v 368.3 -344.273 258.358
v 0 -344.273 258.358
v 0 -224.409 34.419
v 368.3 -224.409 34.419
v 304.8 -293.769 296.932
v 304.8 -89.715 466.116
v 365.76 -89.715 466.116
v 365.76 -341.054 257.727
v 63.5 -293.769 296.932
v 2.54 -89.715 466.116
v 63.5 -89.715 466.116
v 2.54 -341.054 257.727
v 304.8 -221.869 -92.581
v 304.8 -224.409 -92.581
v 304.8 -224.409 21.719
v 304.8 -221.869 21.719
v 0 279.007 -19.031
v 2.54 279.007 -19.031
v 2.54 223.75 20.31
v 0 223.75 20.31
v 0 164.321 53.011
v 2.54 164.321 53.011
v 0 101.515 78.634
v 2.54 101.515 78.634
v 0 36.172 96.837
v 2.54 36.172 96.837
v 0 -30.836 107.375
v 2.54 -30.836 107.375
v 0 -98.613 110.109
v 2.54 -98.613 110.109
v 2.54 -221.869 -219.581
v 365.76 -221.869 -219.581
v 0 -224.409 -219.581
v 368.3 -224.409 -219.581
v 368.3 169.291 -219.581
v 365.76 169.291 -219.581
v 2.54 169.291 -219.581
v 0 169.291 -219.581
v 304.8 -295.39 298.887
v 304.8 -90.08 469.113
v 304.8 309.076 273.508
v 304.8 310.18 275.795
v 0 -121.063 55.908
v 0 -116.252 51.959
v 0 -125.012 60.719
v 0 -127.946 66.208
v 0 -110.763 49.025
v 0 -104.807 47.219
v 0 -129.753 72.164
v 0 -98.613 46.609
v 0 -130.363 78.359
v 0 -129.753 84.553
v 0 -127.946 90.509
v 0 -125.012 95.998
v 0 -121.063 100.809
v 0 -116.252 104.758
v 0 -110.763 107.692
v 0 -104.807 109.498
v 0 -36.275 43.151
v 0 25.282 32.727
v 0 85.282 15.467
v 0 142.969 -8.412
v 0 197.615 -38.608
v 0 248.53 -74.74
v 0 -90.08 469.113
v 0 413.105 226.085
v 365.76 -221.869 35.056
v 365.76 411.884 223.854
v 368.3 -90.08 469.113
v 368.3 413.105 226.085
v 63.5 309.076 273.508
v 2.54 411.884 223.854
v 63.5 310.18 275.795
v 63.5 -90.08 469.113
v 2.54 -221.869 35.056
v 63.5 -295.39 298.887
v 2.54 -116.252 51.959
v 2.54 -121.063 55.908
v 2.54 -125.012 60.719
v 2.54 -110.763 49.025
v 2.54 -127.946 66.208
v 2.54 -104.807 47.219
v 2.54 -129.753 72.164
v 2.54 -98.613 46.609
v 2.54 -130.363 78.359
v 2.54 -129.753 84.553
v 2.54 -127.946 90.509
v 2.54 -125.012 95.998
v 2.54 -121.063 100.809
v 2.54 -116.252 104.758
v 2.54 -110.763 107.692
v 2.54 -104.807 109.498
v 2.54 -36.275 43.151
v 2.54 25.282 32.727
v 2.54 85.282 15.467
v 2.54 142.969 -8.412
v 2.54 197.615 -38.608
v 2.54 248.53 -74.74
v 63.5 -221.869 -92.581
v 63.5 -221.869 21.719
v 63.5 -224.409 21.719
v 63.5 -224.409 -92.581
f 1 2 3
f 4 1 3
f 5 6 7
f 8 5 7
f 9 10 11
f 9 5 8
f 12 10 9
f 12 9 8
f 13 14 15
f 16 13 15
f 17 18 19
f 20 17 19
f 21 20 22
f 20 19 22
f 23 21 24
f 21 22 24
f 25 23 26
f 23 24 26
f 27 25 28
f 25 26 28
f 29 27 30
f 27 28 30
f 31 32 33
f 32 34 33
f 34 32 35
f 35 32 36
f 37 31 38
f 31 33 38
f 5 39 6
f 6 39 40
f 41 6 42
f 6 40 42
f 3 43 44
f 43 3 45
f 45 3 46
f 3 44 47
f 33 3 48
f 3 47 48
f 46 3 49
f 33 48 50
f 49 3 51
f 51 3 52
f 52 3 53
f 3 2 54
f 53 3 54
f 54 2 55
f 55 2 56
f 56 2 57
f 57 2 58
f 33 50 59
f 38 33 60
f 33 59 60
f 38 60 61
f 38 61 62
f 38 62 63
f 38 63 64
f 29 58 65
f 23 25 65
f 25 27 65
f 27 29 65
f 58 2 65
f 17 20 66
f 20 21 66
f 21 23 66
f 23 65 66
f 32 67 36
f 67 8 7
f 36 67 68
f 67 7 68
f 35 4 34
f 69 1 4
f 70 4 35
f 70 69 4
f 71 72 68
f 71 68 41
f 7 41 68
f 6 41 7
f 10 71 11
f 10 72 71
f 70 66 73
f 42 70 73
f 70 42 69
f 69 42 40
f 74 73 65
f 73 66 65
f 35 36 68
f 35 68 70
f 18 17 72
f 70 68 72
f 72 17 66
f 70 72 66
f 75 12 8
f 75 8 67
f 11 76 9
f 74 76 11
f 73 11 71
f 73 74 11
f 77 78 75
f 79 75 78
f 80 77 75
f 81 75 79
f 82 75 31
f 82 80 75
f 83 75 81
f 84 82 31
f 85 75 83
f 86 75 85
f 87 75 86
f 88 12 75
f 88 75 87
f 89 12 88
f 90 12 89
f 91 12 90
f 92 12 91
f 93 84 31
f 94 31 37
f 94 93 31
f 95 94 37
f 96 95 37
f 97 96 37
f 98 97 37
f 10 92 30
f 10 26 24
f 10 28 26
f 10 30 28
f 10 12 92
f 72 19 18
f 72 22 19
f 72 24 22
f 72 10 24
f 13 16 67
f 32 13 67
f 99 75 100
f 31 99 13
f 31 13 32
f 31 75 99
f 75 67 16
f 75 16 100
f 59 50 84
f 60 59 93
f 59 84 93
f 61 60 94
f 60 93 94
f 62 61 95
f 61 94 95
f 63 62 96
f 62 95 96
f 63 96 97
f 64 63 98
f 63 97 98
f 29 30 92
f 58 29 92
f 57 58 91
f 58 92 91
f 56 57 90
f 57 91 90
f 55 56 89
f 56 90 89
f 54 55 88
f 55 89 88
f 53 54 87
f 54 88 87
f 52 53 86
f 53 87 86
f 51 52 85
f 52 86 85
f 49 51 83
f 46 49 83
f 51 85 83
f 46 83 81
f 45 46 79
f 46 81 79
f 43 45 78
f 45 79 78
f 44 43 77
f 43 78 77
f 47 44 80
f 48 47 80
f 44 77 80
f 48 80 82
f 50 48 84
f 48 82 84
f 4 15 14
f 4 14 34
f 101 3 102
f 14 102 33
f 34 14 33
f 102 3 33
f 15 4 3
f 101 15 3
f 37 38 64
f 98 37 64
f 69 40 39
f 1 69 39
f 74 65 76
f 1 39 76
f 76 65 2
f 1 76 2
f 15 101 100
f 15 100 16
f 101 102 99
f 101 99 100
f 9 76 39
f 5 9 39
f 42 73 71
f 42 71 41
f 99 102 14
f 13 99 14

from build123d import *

# Parameters (mm, degrees)
F1_DEPTH  = 368.3
F2_T      = -2.54
F3_W      = 241.3
F3_H      = 444.5
F4_DEPTH  = 25.4
F5_W      = 241.3
F5_H      = 266.7
F6_DEPTH  = 25.4
F7_W      = 241.3
F7_H      = 114.3
F8_DEPTH  = 25.4
F10_DEPTH = 25.4


with BuildPart() as f1:
    # F0 (on Right) → F1 (new body)
    with BuildSketch(Plane.YZ):
        Polygon((-224.4092495818, -219.5814980744), (169.2907504182, -219.5814980744), (413.1046041976, 226.0851988026), (-90.0800447439, 469.1132816853), (-344.2729837605, 258.357523154), (-224.4092495818, 34.4185019256), align=None)
    extrude(amount=F1_DEPTH)

    # F2
    f2_openings = [f1.faces().sort_by_distance(p)[0] for p in [
        (184.15, 291.197677, 3.25185),
        (184.15, -27.55925, -219.581498),
    ]]
    offset(amount=F2_T, openings=f2_openings, kind=Kind.INTERSECTION)

    # F3 (on face) → F4 (cut)
    with BuildSketch(Plane(origin=(0, 166.6783638091, 345.1041253529), x_dir=(1, 0, 0), z_dir=(0, 0.4349106709, 0.9004736023))):
        with Locations((184.15, -62.8870744342)):
            Rectangle(F3_W, F3_H)
    extrude(amount=-F4_DEPTH, mode=Mode.SUBTRACT)

    # F5 (on face) → F6 (cut)
    with BuildSketch(Plane(origin=(0, -267.194897424, 322.2642965476), x_dir=(1, 0, 0), z_dir=(0, -0.6382669853, 0.7698150788))):
        with Locations((184.15, 96.7245433025)):
            Rectangle(F5_W, F5_H)
    extrude(amount=-F6_DEPTH, mode=Mode.SUBTRACT)

    # F7 (on face) → F8 (cut)
    with BuildSketch(Plane.XZ.offset(224.4092495818)):
        with Locations((184.15, -35.4314980744)):
            Rectangle(F7_W, F7_H)
    extrude(amount=-F8_DEPTH, mode=Mode.SUBTRACT)

    # F9 (on face) → F10 (cut)
    with BuildSketch(Plane.YZ.offset(2.54)):
        with BuildLine():
            ThreePointArc((-98.6126363277, 46.6085672379), (85.2821775, 15.4665672824), (248.5302528965, -74.7398215894))
            Line((248.5302528965, -74.7398215894), (279.006984619, -19.0314844798))
            ThreePointArc((279.006984619, -19.0314844798), (101.5154343461, 78.6343708282), (-98.6126363277, 110.1085672379))
            ThreePointArc((-98.6126363277, 110.1085672379), (-130.3626363277, 78.3585672379), (-98.6126363277, 46.6085672379))
        make_face()
    extrude(amount=-F10_DEPTH, mode=Mode.SUBTRACT)


solid = f1.part
